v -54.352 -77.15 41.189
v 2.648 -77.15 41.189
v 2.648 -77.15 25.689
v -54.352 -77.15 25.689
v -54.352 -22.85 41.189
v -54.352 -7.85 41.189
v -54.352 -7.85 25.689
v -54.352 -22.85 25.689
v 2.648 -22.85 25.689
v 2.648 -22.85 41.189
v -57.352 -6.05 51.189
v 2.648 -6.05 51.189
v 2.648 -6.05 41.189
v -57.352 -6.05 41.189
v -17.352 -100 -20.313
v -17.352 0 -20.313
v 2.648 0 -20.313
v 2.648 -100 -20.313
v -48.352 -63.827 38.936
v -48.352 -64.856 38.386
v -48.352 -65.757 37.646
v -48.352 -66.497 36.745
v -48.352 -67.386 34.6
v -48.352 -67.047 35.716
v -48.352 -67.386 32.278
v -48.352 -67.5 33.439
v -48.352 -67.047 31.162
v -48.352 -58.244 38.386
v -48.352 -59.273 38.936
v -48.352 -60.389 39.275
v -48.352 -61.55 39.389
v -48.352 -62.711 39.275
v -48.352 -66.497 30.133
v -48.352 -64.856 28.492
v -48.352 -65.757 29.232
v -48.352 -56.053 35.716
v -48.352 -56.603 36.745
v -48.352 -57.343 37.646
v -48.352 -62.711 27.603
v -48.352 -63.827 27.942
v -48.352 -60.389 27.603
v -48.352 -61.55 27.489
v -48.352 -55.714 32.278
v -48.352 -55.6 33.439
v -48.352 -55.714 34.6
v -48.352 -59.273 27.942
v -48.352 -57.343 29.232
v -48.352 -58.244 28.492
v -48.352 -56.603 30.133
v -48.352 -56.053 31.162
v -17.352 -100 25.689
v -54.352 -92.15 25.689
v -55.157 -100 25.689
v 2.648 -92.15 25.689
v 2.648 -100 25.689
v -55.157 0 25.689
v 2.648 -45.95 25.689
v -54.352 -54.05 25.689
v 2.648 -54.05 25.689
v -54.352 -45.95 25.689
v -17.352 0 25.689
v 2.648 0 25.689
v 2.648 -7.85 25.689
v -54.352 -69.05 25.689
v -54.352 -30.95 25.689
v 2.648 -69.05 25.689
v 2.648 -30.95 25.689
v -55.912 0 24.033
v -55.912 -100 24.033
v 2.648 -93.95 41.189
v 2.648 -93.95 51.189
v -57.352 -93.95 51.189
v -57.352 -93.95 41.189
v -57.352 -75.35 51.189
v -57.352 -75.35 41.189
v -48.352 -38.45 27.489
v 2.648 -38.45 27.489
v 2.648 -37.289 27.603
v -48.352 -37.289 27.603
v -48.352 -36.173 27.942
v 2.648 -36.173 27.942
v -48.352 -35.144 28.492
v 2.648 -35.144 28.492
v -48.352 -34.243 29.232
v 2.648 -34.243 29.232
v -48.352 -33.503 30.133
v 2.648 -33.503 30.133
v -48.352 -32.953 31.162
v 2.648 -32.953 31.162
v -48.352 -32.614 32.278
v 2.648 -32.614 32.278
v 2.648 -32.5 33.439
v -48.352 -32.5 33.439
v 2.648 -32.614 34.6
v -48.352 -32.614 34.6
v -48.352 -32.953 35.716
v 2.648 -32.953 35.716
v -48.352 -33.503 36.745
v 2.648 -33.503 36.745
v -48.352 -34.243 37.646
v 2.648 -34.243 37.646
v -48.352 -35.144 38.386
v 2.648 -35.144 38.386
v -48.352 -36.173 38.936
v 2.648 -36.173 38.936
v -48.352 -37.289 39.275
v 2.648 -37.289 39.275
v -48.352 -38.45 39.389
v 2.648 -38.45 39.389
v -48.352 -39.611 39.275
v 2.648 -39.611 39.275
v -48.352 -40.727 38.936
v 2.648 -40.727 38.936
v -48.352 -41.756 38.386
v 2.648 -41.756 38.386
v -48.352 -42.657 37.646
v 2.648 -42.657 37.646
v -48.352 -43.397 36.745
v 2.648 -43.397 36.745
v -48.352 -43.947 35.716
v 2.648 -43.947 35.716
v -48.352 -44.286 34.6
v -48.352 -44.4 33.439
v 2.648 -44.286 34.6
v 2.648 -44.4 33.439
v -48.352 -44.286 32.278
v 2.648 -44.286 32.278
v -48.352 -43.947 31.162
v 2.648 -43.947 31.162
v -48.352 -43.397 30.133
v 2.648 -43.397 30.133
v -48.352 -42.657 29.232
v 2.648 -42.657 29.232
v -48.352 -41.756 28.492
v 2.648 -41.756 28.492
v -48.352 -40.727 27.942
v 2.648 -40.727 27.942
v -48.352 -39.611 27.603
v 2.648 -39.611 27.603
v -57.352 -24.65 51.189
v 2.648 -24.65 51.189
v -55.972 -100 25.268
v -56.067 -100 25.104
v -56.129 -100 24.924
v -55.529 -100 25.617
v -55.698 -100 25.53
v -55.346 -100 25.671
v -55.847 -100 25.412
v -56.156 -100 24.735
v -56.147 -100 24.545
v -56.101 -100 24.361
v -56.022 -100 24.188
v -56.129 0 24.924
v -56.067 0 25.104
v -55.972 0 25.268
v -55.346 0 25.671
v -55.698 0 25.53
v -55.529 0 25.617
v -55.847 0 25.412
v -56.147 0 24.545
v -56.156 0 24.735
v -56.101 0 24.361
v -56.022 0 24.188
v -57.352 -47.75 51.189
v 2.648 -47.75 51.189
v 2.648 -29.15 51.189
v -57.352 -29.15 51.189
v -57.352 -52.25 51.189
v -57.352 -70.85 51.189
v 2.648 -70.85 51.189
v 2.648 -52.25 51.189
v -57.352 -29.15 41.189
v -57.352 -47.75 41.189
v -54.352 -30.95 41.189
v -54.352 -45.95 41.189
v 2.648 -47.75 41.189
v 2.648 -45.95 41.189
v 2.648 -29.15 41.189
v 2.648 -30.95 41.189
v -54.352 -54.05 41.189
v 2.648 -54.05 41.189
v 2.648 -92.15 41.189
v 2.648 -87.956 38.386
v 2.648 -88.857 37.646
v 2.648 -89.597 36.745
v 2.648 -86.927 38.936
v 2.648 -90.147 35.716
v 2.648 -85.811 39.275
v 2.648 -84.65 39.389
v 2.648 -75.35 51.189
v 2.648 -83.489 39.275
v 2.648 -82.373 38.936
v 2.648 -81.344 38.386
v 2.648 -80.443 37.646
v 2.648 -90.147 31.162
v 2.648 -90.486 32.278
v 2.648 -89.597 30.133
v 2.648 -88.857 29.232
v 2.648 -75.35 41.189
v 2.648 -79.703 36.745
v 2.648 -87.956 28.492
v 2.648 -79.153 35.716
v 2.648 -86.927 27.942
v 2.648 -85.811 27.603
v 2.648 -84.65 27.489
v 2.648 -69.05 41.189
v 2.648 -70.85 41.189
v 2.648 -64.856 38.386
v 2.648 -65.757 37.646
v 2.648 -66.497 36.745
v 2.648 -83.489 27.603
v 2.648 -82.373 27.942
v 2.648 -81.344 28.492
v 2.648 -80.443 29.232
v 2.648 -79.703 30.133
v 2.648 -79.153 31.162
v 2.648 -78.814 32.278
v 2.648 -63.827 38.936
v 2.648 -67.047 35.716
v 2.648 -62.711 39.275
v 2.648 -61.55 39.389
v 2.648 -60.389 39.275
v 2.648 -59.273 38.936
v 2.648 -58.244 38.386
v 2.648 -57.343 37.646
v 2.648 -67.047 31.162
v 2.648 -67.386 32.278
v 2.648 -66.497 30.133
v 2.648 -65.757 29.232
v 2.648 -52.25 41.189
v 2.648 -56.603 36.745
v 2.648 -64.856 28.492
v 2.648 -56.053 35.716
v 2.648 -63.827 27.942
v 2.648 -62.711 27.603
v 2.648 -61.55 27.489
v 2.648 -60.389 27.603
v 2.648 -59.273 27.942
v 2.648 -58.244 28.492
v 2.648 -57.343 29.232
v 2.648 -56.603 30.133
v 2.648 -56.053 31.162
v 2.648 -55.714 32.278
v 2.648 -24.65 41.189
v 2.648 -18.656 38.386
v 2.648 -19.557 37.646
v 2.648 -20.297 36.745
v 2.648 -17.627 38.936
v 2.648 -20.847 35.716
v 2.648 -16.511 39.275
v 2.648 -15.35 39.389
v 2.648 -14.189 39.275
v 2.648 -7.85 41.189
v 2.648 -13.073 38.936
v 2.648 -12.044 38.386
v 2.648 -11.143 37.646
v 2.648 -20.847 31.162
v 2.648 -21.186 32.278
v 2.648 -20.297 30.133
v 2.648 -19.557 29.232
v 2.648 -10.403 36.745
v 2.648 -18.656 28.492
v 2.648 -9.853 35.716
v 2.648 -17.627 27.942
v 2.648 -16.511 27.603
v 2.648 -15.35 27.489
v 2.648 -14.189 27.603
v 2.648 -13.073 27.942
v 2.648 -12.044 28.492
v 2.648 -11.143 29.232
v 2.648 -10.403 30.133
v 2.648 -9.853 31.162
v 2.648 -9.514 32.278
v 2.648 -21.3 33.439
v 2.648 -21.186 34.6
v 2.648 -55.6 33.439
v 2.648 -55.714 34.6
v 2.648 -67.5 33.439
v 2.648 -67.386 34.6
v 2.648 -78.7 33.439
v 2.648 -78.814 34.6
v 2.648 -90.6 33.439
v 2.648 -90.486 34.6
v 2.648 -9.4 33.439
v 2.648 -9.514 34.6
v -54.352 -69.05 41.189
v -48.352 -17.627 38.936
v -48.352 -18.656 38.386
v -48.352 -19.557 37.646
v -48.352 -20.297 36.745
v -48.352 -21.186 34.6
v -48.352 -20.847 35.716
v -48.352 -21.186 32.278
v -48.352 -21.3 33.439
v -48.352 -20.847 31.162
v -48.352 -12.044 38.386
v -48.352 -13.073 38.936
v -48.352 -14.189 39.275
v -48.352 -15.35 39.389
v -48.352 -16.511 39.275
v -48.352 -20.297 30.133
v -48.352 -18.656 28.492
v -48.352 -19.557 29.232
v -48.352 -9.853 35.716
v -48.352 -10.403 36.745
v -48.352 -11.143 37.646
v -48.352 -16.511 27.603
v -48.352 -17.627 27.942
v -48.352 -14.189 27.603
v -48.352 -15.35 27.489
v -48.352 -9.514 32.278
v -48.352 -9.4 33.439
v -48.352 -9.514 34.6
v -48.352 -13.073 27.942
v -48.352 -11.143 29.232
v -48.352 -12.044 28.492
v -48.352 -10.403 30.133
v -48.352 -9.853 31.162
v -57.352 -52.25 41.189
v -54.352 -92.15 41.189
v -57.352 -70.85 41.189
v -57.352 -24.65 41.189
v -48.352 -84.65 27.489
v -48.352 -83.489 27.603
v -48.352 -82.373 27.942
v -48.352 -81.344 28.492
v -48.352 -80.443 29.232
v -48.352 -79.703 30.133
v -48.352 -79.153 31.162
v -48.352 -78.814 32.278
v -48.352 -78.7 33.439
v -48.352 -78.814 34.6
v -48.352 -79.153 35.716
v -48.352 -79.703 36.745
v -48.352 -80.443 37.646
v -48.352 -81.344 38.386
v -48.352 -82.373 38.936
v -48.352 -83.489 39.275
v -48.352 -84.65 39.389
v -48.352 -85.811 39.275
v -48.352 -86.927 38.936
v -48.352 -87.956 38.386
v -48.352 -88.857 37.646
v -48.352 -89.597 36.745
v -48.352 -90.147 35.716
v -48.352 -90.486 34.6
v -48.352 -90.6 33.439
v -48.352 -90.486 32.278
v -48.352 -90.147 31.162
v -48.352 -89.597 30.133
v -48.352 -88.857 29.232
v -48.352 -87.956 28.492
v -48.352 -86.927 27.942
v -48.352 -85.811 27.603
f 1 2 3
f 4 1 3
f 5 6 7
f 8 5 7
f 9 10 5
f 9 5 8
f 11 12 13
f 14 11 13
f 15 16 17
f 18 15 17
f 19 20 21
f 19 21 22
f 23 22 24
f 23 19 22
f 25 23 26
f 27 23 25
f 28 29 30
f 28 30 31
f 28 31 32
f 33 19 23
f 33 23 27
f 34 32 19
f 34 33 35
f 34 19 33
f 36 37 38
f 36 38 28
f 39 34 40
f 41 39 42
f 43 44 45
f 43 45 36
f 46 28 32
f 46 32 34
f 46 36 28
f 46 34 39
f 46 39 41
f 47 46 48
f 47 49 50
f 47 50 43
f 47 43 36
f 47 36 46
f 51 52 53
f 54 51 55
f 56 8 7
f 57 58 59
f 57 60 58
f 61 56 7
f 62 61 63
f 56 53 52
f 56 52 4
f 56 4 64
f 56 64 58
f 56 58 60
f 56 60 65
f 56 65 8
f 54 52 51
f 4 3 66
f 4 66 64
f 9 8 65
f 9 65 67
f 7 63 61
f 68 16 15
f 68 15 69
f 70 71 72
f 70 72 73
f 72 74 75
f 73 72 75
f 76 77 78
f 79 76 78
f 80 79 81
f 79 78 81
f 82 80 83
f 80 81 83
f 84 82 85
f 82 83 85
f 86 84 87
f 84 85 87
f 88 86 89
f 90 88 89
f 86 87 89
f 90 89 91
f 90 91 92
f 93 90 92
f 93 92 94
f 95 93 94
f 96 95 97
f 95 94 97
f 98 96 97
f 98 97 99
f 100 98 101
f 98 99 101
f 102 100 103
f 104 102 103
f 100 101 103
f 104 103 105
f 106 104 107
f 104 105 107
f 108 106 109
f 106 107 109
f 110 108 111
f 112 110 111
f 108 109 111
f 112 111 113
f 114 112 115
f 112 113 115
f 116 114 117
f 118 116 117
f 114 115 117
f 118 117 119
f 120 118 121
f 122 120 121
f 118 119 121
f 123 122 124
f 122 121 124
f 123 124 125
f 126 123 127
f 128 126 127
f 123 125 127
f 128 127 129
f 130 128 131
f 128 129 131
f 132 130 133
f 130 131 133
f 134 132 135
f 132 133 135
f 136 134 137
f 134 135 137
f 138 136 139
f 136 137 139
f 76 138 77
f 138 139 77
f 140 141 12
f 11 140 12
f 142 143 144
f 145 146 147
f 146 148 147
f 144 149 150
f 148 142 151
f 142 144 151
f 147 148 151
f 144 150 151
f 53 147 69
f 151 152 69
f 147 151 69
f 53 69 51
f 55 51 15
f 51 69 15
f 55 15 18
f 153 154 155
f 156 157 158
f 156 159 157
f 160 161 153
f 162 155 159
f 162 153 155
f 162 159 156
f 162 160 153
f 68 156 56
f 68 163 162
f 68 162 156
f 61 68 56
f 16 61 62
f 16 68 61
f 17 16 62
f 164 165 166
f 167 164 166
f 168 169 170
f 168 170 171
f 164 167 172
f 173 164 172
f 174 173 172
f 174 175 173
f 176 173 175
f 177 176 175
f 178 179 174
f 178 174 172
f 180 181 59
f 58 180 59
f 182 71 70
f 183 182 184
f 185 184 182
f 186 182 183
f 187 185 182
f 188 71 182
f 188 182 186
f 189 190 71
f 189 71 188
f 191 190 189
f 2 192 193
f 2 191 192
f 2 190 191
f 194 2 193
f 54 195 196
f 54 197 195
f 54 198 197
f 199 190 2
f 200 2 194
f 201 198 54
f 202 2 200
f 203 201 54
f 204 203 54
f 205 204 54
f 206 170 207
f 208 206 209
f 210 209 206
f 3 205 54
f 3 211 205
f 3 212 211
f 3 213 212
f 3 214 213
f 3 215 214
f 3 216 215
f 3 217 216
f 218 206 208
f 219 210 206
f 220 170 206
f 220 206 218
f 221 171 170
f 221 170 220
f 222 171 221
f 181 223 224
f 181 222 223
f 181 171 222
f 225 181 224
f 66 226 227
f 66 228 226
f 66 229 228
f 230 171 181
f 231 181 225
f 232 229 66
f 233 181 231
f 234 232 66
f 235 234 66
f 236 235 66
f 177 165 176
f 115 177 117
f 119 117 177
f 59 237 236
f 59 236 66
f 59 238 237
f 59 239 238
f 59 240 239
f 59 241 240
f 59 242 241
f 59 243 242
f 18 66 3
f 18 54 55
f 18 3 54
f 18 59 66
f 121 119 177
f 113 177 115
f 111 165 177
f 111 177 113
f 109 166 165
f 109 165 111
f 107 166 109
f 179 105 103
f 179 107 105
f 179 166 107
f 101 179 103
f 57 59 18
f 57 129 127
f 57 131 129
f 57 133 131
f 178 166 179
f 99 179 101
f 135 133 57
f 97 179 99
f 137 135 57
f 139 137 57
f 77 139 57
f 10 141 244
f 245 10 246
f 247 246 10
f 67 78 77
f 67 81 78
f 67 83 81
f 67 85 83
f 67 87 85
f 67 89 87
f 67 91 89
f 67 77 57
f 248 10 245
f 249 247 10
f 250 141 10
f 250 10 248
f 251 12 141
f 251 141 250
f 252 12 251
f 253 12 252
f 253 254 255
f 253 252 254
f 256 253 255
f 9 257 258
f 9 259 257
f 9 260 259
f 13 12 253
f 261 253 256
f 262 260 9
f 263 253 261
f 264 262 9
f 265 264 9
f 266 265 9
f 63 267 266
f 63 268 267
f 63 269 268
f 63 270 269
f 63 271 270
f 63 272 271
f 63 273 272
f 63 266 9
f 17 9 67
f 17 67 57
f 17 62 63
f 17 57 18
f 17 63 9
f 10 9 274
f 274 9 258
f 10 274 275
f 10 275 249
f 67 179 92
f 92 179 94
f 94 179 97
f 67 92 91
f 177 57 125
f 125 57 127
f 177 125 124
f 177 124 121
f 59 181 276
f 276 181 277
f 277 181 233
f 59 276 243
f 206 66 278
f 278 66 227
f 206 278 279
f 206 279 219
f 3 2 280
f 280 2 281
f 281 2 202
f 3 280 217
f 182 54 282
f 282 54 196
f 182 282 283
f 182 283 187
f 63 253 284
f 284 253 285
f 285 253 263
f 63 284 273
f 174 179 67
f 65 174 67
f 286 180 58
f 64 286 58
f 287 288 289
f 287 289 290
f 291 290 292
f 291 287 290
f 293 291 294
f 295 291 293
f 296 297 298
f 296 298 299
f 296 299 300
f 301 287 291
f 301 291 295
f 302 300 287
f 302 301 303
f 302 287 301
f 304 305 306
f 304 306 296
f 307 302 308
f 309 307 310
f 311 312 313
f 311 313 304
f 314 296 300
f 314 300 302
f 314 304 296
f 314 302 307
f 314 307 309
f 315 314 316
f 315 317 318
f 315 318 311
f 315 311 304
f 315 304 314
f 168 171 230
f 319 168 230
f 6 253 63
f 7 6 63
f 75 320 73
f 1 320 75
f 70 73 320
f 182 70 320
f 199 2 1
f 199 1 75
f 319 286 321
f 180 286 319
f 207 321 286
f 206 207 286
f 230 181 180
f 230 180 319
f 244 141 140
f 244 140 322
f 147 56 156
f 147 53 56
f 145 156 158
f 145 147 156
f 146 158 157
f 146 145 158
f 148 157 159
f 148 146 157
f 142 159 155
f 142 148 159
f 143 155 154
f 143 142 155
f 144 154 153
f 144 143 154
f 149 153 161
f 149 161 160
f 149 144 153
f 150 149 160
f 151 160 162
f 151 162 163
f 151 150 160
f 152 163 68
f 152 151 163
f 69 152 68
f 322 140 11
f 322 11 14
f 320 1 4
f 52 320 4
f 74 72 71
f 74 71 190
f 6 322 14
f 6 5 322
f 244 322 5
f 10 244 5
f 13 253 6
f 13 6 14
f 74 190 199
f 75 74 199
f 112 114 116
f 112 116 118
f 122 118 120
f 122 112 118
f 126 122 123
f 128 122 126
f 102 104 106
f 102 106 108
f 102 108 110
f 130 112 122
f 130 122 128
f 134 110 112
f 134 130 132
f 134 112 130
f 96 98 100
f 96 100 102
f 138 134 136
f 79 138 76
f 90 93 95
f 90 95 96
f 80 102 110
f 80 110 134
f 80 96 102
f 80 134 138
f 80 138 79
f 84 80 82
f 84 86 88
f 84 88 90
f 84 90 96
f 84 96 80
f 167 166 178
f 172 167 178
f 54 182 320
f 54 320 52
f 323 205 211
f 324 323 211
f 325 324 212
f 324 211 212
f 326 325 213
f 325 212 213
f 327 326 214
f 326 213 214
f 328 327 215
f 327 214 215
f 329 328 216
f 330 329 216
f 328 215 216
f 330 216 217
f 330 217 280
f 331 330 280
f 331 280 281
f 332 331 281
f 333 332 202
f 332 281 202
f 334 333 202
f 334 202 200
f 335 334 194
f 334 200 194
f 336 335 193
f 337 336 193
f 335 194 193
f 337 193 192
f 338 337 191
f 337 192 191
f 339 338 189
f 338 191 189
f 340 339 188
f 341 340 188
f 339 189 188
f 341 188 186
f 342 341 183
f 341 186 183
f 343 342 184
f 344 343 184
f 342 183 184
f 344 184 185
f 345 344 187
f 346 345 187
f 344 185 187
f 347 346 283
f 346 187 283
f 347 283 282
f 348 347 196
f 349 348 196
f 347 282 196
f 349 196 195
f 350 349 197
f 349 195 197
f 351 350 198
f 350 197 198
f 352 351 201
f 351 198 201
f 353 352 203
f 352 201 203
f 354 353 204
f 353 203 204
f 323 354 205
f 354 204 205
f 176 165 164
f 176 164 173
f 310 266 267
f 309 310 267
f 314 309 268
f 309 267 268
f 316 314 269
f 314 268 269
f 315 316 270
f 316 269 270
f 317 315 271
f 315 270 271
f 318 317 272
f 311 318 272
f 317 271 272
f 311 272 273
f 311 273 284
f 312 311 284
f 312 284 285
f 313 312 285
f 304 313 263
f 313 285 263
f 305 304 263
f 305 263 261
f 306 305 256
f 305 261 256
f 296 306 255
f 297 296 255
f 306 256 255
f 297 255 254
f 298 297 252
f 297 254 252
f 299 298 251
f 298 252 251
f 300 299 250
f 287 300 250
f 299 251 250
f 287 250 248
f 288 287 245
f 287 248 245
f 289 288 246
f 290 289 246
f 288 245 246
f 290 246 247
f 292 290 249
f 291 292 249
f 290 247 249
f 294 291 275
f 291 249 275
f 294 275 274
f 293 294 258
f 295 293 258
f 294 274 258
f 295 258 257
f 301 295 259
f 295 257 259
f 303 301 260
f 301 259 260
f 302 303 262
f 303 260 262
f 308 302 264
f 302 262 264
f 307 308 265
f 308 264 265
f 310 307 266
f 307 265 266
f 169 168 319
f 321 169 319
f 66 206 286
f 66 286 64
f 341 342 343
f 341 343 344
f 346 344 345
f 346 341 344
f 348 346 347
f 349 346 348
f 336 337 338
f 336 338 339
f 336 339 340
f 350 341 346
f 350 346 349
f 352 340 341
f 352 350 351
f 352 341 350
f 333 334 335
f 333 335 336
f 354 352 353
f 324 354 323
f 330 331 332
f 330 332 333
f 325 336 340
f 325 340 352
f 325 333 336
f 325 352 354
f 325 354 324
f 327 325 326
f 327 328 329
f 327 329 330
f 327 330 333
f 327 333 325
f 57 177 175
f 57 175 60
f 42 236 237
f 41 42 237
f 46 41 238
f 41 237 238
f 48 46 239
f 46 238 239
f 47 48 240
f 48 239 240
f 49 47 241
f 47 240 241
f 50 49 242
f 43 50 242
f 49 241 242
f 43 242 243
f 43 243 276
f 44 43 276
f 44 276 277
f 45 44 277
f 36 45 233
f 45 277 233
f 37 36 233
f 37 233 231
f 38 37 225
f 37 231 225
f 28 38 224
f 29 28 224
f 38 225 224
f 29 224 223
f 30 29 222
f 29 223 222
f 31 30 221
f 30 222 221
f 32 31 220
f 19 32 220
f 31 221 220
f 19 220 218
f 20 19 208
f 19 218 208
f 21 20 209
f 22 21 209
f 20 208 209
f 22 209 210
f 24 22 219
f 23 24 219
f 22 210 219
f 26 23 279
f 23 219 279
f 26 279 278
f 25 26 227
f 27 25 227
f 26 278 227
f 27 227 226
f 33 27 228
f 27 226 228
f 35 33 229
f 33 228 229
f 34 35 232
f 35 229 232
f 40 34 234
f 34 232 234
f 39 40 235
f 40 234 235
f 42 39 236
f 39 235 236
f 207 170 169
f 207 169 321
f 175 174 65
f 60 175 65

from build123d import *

# Parameters (mm, degrees)
SKETCH1_W           = 20
SKETCH1_H           = 46.001723395
BOSS_EXTRUDE1_DEPTH = 100
SKETCH8_W           = 15.5
SKETCH8_H           = 15
BOSS_EXTRUDE2_DEPTH = 57
SKETCH10_R          = 5.95
CUT_EXTRUDE1_DEPTH  = 51
SKETCH11_W          = 10
SKETCH11_H          = 18.6
BOSS_EXTRUDE3_DEPTH = 60
FILLET2_R           = 1


with BuildPart() as part:
    # Sketch1 → Boss-Extrude1 (new body)
    with BuildSketch(Plane(origin=(0, 0, 0), x_dir=(1, 0, 0), z_dir=(0, 1, 0))):
        Polygon((-17.351649908, 20.312727502), (-57.351649908, -25.688995893), (-17.351649908, -25.688995893), align=None)
        with Locations((-7.351649908, -2.688134195)):
            Rectangle(SKETCH1_W, SKETCH1_H)
    extrude(amount=-BOSS_EXTRUDE1_DEPTH)

    # Sketch8 → Boss-Extrude2 (add)
    with BuildSketch(Plane(origin=(2.648350092, 0, 0), x_dir=(0, 0, -1), z_dir=(1, 0, 0))):
        with Locations((-33.438995893, -15.35)):
            Rectangle(SKETCH8_W, SKETCH8_H)
        with Locations((-33.438995893, -38.45)):
            Rectangle(SKETCH8_W, SKETCH8_H)
        with Locations((-33.438995893, -61.55)):
            Rectangle(SKETCH8_W, SKETCH8_H)
        with Locations((-33.438995893, -84.65)):
            Rectangle(SKETCH8_W, SKETCH8_H)
    extrude(amount=-BOSS_EXTRUDE2_DEPTH)

    # Sketch10 → Cut-Extrude1 (cut)
    with BuildSketch(Plane(origin=(2.648350092, 0, 0), x_dir=(0, 0, -1), z_dir=(1, 0, 0))):
        with Locations((-33.438995893, -15.35)):
            Circle(SKETCH10_R)
        with Locations((-33.438995893, -38.45)):
            Circle(SKETCH10_R)
        with Locations((-33.438995893, -61.55)):
            Circle(SKETCH10_R)
        with Locations((-33.438995893, -84.65)):
            Circle(SKETCH10_R)
    extrude(amount=-CUT_EXTRUDE1_DEPTH, mode=Mode.SUBTRACT)

    # Sketch11 → Boss-Extrude3 (add)
    with BuildSketch(Plane(origin=(2.648350092, 0, 0), x_dir=(0, 0, -1), z_dir=(1, 0, 0))):
        with Locations((-46.188995893, -15.35)):
            Rectangle(SKETCH11_W, SKETCH11_H)
        with Locations((-46.188995893, -38.45)):
            Rectangle(SKETCH11_W, SKETCH11_H)
        with Locations((-46.188995893, -84.65)):
            Rectangle(SKETCH11_W, SKETCH11_H)
        with Locations((-46.188995893, -61.55)):
            Rectangle(SKETCH11_W, SKETCH11_H)
    extrude(amount=-BOSS_EXTRUDE3_DEPTH)

    # Fillet2
    fillet2_edges = [part.edges().sort_by_distance(p)[0] for p in [
        (-57.351649908, -50, 25.688995893),
    ]]
    fillet(fillet2_edges, radius=FILLET2_R)


solid = part.part
